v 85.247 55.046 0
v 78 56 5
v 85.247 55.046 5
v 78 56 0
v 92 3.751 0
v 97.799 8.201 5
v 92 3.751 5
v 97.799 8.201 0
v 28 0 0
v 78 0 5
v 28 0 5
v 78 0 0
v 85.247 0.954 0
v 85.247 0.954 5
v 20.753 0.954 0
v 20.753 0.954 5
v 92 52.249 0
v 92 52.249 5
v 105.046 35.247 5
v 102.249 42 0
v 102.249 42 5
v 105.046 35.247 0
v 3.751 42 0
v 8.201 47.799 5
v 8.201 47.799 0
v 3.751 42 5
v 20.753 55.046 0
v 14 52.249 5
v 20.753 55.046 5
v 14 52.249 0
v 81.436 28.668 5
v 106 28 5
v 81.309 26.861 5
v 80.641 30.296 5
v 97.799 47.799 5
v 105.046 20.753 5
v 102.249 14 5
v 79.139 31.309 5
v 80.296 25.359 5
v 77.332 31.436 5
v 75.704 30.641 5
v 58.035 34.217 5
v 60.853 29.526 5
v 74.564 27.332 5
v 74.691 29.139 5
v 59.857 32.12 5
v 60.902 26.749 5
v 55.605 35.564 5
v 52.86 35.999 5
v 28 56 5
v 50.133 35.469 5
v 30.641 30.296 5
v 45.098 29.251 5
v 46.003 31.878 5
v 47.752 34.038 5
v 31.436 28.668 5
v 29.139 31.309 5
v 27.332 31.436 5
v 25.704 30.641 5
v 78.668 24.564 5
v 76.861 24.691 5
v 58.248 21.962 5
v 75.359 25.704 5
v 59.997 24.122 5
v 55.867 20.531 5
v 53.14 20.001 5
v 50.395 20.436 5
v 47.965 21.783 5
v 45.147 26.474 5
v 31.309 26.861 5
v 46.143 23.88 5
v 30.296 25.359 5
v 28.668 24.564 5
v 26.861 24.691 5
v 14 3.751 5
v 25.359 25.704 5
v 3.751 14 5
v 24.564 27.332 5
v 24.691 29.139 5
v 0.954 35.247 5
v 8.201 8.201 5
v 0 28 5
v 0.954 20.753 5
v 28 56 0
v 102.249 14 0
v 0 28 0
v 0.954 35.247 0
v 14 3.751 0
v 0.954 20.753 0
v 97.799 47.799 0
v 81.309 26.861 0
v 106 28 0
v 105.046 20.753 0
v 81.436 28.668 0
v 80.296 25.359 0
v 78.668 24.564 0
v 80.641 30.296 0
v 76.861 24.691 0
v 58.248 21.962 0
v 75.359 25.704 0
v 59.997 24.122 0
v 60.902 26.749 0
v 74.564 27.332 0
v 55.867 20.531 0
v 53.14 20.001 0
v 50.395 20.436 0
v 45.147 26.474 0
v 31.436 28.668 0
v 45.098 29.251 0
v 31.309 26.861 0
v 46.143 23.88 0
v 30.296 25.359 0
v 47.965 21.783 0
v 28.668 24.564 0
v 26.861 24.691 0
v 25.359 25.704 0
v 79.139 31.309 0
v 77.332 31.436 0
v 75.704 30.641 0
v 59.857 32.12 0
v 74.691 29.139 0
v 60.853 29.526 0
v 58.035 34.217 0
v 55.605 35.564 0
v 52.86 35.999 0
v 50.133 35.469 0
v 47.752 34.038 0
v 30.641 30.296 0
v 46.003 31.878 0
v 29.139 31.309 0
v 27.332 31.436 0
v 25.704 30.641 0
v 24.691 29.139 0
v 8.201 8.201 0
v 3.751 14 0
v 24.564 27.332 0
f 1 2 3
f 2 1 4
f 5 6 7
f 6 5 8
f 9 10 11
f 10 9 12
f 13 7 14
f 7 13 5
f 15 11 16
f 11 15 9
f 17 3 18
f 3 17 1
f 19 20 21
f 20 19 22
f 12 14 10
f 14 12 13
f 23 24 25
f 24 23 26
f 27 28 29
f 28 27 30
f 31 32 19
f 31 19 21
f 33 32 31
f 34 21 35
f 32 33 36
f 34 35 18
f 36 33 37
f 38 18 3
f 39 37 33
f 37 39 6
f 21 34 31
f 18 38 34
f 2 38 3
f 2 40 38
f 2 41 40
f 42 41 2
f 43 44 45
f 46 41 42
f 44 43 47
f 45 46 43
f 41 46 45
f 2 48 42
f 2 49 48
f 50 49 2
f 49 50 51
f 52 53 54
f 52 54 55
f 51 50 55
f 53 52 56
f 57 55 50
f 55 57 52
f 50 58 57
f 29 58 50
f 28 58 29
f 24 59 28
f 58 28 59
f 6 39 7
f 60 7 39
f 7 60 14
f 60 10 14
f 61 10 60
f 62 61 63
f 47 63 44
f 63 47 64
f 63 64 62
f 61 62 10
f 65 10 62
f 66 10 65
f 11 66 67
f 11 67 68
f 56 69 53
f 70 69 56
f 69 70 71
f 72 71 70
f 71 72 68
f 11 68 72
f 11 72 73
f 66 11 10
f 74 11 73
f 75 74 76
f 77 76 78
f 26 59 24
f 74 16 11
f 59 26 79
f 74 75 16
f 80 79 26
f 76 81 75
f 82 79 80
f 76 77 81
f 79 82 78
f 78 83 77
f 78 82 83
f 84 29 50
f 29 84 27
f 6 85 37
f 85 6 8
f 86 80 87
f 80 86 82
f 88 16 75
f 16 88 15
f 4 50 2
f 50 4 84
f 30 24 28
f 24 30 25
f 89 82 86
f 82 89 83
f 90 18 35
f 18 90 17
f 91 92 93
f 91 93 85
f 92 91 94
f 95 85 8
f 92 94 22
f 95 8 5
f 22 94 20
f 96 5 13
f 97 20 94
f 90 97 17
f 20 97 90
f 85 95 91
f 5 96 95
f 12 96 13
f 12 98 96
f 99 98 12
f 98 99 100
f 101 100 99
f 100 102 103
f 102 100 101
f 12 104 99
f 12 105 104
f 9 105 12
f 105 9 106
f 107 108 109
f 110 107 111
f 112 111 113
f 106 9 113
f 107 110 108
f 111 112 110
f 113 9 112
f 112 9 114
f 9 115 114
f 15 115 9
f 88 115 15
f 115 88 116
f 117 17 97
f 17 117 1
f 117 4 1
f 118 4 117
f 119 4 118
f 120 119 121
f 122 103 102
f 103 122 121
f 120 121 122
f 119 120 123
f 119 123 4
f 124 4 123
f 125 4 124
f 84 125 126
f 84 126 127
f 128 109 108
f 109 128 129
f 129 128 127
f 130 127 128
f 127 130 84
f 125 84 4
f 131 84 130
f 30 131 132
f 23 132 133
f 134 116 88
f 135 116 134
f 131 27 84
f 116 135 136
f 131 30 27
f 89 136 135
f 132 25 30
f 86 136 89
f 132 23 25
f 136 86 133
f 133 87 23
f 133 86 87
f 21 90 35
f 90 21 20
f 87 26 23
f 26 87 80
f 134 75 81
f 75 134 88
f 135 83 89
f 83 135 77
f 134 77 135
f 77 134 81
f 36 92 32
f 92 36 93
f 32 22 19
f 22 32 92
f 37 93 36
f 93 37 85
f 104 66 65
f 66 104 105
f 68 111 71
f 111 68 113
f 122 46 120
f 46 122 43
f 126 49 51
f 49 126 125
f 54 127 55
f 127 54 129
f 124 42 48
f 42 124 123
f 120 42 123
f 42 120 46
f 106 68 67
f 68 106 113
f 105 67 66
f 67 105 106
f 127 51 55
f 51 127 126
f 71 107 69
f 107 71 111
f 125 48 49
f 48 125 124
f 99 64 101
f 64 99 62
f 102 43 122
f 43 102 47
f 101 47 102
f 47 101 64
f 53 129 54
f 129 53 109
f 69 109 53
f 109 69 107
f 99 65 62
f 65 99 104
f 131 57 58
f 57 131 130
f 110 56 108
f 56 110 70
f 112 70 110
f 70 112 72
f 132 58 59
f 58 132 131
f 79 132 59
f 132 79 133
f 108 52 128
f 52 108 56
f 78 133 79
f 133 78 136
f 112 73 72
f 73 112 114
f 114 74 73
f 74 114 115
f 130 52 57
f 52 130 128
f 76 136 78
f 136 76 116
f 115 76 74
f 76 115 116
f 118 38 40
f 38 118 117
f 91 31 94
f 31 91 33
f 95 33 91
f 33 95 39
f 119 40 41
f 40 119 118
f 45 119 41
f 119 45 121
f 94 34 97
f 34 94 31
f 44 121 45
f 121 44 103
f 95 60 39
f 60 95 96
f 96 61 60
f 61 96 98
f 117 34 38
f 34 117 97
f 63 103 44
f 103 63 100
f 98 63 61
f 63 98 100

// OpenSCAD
$fn = 32;

// ----------------------------------------------------------------------
// Spacer plate: obround span 50, caps R28
// ----------------------------------------------------------------------

// --- parameters (mm) ---
bore_r = 8;               // centre bore radius
bolt_r = 3.5;             // bolt hole radius
plate_t = 5;              // plate thickness, Z (extrusion height)
span = 50;                // obround span
cap_r = 28;               // cap radius

profile = [[28, 56], [20.753, 55.046], [14, 52.249], [8.201, 47.799], [3.751, 42], [0.954, 35.247], [0, 28], [0.954, 20.753], [3.751, 14], [8.201, 8.201], [14, 3.751], [20.753, 0.954], [28, 0], [78, 0], [85.247, 0.954], [92, 3.751], [97.799, 8.201], [102.249, 14], [105.046, 20.753], [106, 28], [105.046, 35.247], [102.249, 42], [97.799, 47.799], [92, 52.249], [85.247, 55.046], [78, 56]];  // primary outline, 26 points, counter clockwise
void_1 = [[60.853, 29.526], [59.857, 32.12], [58.035, 34.217], [55.605, 35.564], [52.86, 35.999], [50.133, 35.469], [47.752, 34.038], [46.003, 31.878], [45.098, 29.251], [45.147, 26.474], [46.143, 23.88], [47.965, 21.783], [50.395, 20.436], [53.14, 20.001], [55.867, 20.531], [58.248, 21.962], [59.997, 24.122], [60.902, 26.749]];  // centre bore, 18 points
void_2 = [[31.436, 28.668], [30.641, 30.296], [29.139, 31.309], [27.332, 31.436], [25.704, 30.641], [24.691, 29.139], [24.564, 27.332], [25.359, 25.704], [26.861, 24.691], [28.668, 24.564], [30.296, 25.359], [31.309, 26.861]];  // end hole, 12 points
void_3 = [[81.436, 28.668], [80.641, 30.296], [79.139, 31.309], [77.332, 31.436], [75.704, 30.641], [74.691, 29.139], [74.564, 27.332], [75.359, 25.704], [76.861, 24.691], [78.668, 24.564], [80.296, 25.359], [81.309, 26.861]];  // end hole, 12 points

// --- the one profile operation ---
difference() {
  linear_extrude(height = plate_t) polygon(points = profile);
  translate([0, 0, -1])
    linear_extrude(height = plate_t + 2) polygon(points = void_1);
  translate([0, 0, -1])
    linear_extrude(height = plate_t + 2) polygon(points = void_2);
  translate([0, 0, -1])
    linear_extrude(height = plate_t + 2) polygon(points = void_3);
}
